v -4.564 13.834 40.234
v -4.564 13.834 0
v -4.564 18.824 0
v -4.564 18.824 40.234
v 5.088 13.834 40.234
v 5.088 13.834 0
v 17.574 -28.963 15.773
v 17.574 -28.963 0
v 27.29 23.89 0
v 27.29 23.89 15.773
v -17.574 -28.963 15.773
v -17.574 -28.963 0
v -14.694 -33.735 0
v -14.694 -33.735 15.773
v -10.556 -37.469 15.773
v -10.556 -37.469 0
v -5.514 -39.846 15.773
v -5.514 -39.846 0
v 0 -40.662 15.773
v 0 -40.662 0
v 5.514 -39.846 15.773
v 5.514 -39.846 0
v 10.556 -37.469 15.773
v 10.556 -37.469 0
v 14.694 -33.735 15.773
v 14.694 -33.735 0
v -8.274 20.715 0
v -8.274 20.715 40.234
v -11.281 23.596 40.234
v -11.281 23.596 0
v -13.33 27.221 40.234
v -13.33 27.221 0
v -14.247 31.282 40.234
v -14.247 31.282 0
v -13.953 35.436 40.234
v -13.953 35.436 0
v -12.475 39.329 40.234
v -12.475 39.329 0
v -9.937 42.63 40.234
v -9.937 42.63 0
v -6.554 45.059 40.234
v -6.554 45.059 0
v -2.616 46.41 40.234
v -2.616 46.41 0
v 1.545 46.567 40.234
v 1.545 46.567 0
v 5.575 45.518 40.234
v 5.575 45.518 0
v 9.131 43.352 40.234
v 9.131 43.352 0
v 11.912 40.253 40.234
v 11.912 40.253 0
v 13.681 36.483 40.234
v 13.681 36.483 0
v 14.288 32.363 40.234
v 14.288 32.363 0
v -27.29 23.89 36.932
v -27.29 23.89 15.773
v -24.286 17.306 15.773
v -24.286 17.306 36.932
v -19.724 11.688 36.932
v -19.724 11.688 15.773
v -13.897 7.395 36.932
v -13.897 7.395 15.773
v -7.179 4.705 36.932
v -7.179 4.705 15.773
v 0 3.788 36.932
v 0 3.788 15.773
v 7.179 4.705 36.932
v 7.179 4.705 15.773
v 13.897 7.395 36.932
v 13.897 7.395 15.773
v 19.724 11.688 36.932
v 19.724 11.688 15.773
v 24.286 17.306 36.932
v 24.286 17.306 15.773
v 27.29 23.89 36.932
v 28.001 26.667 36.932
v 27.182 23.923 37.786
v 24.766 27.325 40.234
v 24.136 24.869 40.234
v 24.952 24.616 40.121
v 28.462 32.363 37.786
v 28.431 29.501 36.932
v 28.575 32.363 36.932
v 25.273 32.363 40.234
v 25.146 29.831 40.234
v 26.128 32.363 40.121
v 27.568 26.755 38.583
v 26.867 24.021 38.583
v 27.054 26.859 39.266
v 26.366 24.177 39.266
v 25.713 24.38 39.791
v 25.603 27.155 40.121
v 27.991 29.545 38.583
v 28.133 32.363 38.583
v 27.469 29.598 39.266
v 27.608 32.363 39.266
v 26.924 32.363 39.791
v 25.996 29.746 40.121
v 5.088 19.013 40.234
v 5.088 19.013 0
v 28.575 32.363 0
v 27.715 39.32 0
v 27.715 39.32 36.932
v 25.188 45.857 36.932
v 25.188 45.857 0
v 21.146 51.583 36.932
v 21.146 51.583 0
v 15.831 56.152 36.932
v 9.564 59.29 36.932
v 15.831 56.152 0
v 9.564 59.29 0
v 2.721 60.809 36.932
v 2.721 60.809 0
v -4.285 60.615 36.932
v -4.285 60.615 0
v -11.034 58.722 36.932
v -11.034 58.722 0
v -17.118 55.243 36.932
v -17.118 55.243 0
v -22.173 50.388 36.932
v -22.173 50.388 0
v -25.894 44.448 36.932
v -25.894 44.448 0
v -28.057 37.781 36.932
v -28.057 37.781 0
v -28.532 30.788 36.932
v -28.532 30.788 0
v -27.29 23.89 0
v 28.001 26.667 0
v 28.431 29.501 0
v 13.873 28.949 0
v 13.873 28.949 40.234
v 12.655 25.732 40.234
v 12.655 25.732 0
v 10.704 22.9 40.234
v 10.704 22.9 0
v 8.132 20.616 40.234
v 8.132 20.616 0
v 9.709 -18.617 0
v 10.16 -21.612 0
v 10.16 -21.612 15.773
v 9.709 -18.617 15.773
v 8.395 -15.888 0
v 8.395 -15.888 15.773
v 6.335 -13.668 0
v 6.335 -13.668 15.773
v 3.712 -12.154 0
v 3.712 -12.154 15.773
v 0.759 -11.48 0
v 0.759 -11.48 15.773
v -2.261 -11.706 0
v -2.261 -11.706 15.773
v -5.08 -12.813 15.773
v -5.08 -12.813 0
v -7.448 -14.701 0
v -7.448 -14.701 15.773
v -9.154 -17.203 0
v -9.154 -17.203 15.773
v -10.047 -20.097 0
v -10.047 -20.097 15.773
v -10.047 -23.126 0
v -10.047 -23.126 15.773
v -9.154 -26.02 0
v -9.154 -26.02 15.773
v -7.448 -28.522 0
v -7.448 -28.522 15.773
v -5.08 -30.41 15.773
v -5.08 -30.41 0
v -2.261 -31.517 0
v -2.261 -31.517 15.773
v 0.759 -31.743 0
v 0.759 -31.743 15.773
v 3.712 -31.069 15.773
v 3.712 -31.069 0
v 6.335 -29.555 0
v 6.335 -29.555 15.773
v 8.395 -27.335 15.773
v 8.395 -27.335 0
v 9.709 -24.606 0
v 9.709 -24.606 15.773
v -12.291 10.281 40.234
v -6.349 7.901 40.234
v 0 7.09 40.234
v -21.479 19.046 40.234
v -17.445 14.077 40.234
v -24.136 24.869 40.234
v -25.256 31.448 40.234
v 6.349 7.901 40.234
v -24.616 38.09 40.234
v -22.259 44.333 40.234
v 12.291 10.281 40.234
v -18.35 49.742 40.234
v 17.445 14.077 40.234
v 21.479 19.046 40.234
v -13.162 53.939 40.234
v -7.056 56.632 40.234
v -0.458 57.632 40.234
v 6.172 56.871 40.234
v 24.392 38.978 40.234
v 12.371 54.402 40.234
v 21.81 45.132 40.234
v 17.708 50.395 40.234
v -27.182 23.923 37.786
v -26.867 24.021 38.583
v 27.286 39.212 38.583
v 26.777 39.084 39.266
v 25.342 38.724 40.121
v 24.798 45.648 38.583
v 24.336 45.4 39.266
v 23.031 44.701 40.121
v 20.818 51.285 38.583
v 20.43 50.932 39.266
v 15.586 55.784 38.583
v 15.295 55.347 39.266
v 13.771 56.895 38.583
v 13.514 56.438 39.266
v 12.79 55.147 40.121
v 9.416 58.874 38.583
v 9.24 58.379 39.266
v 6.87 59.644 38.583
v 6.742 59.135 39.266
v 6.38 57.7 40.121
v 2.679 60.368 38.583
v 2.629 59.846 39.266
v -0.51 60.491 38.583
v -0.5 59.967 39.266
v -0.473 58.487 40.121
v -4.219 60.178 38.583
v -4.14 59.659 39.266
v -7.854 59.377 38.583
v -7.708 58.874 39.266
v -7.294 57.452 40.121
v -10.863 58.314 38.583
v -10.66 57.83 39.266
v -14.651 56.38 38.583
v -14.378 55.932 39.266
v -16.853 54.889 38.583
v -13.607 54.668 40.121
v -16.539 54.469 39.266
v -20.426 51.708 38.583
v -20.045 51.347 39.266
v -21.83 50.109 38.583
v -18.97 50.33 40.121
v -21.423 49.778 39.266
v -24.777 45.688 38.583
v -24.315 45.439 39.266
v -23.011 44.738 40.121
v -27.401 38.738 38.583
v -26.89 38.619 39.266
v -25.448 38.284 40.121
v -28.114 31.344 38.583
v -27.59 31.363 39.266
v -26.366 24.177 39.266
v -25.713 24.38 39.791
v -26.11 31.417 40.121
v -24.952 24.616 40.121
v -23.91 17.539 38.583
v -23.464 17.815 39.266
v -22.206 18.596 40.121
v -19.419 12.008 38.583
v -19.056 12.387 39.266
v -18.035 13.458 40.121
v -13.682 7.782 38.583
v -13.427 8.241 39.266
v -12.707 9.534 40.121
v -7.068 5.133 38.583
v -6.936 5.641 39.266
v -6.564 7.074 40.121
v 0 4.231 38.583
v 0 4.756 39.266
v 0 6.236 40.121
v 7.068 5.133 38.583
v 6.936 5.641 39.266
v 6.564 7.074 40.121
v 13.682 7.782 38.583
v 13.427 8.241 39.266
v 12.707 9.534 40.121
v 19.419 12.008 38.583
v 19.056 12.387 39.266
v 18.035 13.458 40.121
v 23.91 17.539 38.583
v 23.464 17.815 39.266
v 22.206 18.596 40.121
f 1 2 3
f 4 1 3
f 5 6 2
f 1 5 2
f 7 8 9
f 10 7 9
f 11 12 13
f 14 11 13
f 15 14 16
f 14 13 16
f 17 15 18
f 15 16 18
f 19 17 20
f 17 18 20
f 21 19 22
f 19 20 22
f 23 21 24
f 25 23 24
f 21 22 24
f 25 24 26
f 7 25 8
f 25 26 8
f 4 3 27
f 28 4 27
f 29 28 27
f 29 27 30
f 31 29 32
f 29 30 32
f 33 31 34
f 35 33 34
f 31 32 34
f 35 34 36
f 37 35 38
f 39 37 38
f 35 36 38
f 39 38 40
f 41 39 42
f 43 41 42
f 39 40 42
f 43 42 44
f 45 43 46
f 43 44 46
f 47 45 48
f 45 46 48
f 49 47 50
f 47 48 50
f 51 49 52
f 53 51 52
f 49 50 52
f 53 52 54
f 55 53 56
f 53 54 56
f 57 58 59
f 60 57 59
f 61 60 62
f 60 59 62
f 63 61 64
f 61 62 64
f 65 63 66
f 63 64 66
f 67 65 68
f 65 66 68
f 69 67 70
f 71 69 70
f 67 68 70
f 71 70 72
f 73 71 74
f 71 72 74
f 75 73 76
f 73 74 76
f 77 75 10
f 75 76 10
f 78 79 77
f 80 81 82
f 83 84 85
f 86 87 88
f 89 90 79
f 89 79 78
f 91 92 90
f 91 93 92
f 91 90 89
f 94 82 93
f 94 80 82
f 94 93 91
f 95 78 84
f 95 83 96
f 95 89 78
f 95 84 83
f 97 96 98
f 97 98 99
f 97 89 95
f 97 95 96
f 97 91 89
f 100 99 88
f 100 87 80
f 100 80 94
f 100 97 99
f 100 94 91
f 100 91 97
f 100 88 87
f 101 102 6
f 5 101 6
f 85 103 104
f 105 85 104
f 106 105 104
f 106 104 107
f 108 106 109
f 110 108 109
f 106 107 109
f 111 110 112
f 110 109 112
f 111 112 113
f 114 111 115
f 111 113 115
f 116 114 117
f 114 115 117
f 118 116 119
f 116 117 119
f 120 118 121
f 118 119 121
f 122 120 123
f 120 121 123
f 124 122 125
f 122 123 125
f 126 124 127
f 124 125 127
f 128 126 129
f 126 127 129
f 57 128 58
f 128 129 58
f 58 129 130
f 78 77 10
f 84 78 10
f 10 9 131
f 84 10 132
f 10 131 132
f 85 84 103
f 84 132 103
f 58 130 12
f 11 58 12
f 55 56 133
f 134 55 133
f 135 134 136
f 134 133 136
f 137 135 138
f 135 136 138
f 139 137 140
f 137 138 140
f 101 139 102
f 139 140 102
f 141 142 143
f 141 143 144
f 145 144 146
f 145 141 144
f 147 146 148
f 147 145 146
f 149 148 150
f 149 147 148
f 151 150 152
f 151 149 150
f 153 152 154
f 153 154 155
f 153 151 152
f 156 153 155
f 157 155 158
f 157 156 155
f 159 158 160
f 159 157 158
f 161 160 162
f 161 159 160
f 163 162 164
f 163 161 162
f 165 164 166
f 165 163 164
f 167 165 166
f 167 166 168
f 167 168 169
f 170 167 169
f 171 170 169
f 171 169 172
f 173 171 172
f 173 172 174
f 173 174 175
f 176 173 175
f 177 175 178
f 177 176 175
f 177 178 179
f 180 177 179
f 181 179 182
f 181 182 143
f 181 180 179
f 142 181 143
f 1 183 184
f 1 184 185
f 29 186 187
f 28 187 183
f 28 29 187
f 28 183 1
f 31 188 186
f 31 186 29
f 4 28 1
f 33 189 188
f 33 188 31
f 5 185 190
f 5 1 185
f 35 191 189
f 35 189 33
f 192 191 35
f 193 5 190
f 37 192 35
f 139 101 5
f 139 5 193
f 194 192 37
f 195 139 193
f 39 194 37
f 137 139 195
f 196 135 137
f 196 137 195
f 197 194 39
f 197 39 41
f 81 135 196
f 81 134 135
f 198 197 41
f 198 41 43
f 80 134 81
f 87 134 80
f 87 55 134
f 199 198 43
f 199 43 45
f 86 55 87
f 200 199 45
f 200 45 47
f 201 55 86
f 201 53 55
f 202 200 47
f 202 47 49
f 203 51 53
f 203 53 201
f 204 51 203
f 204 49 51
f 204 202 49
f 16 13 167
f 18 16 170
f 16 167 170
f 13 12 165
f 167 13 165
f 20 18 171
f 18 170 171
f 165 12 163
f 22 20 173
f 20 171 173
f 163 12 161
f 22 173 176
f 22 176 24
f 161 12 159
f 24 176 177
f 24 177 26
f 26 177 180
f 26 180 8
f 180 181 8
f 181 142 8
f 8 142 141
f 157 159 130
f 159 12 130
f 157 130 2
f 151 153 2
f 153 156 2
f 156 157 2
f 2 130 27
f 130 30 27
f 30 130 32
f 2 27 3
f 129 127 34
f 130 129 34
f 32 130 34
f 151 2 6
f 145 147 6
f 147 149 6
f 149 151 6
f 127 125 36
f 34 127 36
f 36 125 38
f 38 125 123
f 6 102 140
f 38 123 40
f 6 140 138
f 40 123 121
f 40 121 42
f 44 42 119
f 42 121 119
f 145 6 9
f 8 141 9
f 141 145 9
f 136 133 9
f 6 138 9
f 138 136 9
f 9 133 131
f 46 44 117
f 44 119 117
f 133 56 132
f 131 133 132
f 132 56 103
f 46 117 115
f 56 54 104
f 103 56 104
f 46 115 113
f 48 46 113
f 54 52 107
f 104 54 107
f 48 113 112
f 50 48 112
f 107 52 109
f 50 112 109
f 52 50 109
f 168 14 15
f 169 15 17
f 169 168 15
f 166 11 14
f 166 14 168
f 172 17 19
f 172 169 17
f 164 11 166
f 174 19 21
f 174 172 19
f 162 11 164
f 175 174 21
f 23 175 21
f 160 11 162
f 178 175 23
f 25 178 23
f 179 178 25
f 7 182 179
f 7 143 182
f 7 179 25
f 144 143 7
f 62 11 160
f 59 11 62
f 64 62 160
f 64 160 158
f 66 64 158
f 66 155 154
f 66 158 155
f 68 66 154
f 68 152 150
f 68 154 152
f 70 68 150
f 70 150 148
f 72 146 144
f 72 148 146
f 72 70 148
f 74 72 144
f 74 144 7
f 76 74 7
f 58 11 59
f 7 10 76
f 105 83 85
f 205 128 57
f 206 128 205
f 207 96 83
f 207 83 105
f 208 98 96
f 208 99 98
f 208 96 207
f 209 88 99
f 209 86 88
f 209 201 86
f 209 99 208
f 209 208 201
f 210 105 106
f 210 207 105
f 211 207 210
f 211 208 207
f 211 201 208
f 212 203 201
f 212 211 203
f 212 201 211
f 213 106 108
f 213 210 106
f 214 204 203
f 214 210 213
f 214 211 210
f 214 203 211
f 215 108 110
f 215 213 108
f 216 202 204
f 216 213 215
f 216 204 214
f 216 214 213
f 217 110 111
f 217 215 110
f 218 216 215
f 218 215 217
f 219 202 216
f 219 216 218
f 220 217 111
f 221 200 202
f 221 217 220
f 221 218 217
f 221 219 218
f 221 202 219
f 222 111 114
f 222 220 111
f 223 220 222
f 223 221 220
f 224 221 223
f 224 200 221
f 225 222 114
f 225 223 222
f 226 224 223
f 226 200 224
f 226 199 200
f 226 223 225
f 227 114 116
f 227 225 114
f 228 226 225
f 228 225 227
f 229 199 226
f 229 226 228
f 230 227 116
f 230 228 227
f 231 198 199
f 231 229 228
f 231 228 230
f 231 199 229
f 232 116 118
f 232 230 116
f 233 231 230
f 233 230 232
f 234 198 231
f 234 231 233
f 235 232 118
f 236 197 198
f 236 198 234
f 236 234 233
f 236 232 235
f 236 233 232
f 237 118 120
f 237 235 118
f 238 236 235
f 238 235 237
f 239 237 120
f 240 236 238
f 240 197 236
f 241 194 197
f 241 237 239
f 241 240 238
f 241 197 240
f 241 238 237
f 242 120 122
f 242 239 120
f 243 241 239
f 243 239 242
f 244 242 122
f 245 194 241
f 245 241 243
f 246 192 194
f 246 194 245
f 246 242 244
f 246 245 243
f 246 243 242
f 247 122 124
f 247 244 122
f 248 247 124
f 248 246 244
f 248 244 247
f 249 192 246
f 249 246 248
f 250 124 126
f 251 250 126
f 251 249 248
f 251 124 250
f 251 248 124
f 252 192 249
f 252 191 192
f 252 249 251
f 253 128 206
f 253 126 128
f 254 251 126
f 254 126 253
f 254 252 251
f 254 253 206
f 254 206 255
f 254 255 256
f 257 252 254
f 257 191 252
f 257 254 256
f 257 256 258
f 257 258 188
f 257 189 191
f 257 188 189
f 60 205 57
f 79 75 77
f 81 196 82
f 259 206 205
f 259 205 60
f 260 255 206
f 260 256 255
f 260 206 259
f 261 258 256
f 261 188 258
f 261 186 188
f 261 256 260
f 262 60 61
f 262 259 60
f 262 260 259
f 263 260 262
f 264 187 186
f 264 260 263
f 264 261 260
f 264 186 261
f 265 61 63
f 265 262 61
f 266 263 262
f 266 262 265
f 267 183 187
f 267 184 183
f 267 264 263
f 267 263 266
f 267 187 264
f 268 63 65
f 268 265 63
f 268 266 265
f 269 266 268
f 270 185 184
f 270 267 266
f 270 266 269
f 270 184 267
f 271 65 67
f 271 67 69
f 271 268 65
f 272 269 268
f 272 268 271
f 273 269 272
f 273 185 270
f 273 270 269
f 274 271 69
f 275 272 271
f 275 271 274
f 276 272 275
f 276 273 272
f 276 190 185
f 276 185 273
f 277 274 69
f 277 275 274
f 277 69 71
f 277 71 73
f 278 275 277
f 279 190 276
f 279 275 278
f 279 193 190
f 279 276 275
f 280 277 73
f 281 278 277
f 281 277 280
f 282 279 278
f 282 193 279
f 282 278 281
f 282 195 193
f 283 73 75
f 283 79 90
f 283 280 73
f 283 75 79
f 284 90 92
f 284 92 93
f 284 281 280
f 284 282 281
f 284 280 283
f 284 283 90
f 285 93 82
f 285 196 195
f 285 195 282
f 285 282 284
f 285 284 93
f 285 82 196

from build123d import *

# Parameters (mm, degrees)
F1_DEPTH = 40.2336
F0_R     = 10.16
F2_DEPTH = 15.7734
F3_R     = 3.302


with BuildPart() as f1:
    # F0 (on Top) → F1 (new body)
    with BuildSketch(Plane.XY):
        with BuildLine():
            ThreePointArc((27.2897645342, 23.8900197129), (28.2518640674, 28.0782870201), (28.575, 32.3634709971))
            ThreePointArc((28.575, 32.3634709971), (-4.2851839771, 60.6153350645), (-27.2897645342, 23.8900197129))
            ThreePointArc((-27.2897645342, 23.8900197129), (0, 3.7884709971), (27.2897645342, 23.8900197129))
        make_face()
        with BuildLine():
            ThreePointArc((-4.5638517477, 18.8244934333), (-8.3344653219, 43.9681831455), (14.2875, 32.3634709971))
            ThreePointArc((14.2875, 32.3634709971), (11.7649813941, 24.2568151486), (5.0881482523, 19.0126881133))
            Line((5.0881482523, 19.0126881133), (5.0881482523, 13.8341709971))
            Line((5.0881482523, 13.8341709971), (-4.5638517477, 13.8341709971))
            Line((-4.5638517477, 13.8341709971), (-4.5638517477, 18.8244934333))
        make_face(mode=Mode.SUBTRACT)
    extrude(amount=F1_DEPTH)

    # F0 (on Top) → F2 (join)
    with BuildSketch(Plane.XY):
        with BuildLine():
            ThreePointArc((27.2897645342, 23.8900197129), (0, 3.7884709971), (-27.2897645342, 23.8900197129))
            Line((-27.2897645342, 23.8900197129), (-19.0398767625, -20.990567758))
            ThreePointArc((-19.0398767625, -20.990567758), (0, -2.5615290029), (19.0398767625, -20.990567758))
            Line((19.0398767625, -20.990567758), (27.2897645342, 23.8900197129))
        make_face()
        with BuildLine():
            ThreePointArc((19.0398767625, -20.990567758), (0, -2.5615290029), (-19.0398767625, -20.990567758))
            Line((-19.0398767625, -20.990567758), (-17.5744174222, -28.9628793733))
            ThreePointArc((-17.5744174222, -28.9628793733), (0, -40.6615290029), (17.5744174222, -28.9628793733))
            Line((17.5744174222, -28.9628793733), (19.0398767625, -20.990567758))
        make_face()
        with Locations((0, -21.6115290029)):
            Circle(F0_R, mode=Mode.SUBTRACT)
    extrude(amount=F2_DEPTH)

    # F3
    f3_edges = [f1.edges().sort_by_distance(p)[0] for p in [
        (27.289765, 40.836922, 40.2336),
    ]]
    fillet(f3_edges, radius=F3_R)


solid = f1.part
